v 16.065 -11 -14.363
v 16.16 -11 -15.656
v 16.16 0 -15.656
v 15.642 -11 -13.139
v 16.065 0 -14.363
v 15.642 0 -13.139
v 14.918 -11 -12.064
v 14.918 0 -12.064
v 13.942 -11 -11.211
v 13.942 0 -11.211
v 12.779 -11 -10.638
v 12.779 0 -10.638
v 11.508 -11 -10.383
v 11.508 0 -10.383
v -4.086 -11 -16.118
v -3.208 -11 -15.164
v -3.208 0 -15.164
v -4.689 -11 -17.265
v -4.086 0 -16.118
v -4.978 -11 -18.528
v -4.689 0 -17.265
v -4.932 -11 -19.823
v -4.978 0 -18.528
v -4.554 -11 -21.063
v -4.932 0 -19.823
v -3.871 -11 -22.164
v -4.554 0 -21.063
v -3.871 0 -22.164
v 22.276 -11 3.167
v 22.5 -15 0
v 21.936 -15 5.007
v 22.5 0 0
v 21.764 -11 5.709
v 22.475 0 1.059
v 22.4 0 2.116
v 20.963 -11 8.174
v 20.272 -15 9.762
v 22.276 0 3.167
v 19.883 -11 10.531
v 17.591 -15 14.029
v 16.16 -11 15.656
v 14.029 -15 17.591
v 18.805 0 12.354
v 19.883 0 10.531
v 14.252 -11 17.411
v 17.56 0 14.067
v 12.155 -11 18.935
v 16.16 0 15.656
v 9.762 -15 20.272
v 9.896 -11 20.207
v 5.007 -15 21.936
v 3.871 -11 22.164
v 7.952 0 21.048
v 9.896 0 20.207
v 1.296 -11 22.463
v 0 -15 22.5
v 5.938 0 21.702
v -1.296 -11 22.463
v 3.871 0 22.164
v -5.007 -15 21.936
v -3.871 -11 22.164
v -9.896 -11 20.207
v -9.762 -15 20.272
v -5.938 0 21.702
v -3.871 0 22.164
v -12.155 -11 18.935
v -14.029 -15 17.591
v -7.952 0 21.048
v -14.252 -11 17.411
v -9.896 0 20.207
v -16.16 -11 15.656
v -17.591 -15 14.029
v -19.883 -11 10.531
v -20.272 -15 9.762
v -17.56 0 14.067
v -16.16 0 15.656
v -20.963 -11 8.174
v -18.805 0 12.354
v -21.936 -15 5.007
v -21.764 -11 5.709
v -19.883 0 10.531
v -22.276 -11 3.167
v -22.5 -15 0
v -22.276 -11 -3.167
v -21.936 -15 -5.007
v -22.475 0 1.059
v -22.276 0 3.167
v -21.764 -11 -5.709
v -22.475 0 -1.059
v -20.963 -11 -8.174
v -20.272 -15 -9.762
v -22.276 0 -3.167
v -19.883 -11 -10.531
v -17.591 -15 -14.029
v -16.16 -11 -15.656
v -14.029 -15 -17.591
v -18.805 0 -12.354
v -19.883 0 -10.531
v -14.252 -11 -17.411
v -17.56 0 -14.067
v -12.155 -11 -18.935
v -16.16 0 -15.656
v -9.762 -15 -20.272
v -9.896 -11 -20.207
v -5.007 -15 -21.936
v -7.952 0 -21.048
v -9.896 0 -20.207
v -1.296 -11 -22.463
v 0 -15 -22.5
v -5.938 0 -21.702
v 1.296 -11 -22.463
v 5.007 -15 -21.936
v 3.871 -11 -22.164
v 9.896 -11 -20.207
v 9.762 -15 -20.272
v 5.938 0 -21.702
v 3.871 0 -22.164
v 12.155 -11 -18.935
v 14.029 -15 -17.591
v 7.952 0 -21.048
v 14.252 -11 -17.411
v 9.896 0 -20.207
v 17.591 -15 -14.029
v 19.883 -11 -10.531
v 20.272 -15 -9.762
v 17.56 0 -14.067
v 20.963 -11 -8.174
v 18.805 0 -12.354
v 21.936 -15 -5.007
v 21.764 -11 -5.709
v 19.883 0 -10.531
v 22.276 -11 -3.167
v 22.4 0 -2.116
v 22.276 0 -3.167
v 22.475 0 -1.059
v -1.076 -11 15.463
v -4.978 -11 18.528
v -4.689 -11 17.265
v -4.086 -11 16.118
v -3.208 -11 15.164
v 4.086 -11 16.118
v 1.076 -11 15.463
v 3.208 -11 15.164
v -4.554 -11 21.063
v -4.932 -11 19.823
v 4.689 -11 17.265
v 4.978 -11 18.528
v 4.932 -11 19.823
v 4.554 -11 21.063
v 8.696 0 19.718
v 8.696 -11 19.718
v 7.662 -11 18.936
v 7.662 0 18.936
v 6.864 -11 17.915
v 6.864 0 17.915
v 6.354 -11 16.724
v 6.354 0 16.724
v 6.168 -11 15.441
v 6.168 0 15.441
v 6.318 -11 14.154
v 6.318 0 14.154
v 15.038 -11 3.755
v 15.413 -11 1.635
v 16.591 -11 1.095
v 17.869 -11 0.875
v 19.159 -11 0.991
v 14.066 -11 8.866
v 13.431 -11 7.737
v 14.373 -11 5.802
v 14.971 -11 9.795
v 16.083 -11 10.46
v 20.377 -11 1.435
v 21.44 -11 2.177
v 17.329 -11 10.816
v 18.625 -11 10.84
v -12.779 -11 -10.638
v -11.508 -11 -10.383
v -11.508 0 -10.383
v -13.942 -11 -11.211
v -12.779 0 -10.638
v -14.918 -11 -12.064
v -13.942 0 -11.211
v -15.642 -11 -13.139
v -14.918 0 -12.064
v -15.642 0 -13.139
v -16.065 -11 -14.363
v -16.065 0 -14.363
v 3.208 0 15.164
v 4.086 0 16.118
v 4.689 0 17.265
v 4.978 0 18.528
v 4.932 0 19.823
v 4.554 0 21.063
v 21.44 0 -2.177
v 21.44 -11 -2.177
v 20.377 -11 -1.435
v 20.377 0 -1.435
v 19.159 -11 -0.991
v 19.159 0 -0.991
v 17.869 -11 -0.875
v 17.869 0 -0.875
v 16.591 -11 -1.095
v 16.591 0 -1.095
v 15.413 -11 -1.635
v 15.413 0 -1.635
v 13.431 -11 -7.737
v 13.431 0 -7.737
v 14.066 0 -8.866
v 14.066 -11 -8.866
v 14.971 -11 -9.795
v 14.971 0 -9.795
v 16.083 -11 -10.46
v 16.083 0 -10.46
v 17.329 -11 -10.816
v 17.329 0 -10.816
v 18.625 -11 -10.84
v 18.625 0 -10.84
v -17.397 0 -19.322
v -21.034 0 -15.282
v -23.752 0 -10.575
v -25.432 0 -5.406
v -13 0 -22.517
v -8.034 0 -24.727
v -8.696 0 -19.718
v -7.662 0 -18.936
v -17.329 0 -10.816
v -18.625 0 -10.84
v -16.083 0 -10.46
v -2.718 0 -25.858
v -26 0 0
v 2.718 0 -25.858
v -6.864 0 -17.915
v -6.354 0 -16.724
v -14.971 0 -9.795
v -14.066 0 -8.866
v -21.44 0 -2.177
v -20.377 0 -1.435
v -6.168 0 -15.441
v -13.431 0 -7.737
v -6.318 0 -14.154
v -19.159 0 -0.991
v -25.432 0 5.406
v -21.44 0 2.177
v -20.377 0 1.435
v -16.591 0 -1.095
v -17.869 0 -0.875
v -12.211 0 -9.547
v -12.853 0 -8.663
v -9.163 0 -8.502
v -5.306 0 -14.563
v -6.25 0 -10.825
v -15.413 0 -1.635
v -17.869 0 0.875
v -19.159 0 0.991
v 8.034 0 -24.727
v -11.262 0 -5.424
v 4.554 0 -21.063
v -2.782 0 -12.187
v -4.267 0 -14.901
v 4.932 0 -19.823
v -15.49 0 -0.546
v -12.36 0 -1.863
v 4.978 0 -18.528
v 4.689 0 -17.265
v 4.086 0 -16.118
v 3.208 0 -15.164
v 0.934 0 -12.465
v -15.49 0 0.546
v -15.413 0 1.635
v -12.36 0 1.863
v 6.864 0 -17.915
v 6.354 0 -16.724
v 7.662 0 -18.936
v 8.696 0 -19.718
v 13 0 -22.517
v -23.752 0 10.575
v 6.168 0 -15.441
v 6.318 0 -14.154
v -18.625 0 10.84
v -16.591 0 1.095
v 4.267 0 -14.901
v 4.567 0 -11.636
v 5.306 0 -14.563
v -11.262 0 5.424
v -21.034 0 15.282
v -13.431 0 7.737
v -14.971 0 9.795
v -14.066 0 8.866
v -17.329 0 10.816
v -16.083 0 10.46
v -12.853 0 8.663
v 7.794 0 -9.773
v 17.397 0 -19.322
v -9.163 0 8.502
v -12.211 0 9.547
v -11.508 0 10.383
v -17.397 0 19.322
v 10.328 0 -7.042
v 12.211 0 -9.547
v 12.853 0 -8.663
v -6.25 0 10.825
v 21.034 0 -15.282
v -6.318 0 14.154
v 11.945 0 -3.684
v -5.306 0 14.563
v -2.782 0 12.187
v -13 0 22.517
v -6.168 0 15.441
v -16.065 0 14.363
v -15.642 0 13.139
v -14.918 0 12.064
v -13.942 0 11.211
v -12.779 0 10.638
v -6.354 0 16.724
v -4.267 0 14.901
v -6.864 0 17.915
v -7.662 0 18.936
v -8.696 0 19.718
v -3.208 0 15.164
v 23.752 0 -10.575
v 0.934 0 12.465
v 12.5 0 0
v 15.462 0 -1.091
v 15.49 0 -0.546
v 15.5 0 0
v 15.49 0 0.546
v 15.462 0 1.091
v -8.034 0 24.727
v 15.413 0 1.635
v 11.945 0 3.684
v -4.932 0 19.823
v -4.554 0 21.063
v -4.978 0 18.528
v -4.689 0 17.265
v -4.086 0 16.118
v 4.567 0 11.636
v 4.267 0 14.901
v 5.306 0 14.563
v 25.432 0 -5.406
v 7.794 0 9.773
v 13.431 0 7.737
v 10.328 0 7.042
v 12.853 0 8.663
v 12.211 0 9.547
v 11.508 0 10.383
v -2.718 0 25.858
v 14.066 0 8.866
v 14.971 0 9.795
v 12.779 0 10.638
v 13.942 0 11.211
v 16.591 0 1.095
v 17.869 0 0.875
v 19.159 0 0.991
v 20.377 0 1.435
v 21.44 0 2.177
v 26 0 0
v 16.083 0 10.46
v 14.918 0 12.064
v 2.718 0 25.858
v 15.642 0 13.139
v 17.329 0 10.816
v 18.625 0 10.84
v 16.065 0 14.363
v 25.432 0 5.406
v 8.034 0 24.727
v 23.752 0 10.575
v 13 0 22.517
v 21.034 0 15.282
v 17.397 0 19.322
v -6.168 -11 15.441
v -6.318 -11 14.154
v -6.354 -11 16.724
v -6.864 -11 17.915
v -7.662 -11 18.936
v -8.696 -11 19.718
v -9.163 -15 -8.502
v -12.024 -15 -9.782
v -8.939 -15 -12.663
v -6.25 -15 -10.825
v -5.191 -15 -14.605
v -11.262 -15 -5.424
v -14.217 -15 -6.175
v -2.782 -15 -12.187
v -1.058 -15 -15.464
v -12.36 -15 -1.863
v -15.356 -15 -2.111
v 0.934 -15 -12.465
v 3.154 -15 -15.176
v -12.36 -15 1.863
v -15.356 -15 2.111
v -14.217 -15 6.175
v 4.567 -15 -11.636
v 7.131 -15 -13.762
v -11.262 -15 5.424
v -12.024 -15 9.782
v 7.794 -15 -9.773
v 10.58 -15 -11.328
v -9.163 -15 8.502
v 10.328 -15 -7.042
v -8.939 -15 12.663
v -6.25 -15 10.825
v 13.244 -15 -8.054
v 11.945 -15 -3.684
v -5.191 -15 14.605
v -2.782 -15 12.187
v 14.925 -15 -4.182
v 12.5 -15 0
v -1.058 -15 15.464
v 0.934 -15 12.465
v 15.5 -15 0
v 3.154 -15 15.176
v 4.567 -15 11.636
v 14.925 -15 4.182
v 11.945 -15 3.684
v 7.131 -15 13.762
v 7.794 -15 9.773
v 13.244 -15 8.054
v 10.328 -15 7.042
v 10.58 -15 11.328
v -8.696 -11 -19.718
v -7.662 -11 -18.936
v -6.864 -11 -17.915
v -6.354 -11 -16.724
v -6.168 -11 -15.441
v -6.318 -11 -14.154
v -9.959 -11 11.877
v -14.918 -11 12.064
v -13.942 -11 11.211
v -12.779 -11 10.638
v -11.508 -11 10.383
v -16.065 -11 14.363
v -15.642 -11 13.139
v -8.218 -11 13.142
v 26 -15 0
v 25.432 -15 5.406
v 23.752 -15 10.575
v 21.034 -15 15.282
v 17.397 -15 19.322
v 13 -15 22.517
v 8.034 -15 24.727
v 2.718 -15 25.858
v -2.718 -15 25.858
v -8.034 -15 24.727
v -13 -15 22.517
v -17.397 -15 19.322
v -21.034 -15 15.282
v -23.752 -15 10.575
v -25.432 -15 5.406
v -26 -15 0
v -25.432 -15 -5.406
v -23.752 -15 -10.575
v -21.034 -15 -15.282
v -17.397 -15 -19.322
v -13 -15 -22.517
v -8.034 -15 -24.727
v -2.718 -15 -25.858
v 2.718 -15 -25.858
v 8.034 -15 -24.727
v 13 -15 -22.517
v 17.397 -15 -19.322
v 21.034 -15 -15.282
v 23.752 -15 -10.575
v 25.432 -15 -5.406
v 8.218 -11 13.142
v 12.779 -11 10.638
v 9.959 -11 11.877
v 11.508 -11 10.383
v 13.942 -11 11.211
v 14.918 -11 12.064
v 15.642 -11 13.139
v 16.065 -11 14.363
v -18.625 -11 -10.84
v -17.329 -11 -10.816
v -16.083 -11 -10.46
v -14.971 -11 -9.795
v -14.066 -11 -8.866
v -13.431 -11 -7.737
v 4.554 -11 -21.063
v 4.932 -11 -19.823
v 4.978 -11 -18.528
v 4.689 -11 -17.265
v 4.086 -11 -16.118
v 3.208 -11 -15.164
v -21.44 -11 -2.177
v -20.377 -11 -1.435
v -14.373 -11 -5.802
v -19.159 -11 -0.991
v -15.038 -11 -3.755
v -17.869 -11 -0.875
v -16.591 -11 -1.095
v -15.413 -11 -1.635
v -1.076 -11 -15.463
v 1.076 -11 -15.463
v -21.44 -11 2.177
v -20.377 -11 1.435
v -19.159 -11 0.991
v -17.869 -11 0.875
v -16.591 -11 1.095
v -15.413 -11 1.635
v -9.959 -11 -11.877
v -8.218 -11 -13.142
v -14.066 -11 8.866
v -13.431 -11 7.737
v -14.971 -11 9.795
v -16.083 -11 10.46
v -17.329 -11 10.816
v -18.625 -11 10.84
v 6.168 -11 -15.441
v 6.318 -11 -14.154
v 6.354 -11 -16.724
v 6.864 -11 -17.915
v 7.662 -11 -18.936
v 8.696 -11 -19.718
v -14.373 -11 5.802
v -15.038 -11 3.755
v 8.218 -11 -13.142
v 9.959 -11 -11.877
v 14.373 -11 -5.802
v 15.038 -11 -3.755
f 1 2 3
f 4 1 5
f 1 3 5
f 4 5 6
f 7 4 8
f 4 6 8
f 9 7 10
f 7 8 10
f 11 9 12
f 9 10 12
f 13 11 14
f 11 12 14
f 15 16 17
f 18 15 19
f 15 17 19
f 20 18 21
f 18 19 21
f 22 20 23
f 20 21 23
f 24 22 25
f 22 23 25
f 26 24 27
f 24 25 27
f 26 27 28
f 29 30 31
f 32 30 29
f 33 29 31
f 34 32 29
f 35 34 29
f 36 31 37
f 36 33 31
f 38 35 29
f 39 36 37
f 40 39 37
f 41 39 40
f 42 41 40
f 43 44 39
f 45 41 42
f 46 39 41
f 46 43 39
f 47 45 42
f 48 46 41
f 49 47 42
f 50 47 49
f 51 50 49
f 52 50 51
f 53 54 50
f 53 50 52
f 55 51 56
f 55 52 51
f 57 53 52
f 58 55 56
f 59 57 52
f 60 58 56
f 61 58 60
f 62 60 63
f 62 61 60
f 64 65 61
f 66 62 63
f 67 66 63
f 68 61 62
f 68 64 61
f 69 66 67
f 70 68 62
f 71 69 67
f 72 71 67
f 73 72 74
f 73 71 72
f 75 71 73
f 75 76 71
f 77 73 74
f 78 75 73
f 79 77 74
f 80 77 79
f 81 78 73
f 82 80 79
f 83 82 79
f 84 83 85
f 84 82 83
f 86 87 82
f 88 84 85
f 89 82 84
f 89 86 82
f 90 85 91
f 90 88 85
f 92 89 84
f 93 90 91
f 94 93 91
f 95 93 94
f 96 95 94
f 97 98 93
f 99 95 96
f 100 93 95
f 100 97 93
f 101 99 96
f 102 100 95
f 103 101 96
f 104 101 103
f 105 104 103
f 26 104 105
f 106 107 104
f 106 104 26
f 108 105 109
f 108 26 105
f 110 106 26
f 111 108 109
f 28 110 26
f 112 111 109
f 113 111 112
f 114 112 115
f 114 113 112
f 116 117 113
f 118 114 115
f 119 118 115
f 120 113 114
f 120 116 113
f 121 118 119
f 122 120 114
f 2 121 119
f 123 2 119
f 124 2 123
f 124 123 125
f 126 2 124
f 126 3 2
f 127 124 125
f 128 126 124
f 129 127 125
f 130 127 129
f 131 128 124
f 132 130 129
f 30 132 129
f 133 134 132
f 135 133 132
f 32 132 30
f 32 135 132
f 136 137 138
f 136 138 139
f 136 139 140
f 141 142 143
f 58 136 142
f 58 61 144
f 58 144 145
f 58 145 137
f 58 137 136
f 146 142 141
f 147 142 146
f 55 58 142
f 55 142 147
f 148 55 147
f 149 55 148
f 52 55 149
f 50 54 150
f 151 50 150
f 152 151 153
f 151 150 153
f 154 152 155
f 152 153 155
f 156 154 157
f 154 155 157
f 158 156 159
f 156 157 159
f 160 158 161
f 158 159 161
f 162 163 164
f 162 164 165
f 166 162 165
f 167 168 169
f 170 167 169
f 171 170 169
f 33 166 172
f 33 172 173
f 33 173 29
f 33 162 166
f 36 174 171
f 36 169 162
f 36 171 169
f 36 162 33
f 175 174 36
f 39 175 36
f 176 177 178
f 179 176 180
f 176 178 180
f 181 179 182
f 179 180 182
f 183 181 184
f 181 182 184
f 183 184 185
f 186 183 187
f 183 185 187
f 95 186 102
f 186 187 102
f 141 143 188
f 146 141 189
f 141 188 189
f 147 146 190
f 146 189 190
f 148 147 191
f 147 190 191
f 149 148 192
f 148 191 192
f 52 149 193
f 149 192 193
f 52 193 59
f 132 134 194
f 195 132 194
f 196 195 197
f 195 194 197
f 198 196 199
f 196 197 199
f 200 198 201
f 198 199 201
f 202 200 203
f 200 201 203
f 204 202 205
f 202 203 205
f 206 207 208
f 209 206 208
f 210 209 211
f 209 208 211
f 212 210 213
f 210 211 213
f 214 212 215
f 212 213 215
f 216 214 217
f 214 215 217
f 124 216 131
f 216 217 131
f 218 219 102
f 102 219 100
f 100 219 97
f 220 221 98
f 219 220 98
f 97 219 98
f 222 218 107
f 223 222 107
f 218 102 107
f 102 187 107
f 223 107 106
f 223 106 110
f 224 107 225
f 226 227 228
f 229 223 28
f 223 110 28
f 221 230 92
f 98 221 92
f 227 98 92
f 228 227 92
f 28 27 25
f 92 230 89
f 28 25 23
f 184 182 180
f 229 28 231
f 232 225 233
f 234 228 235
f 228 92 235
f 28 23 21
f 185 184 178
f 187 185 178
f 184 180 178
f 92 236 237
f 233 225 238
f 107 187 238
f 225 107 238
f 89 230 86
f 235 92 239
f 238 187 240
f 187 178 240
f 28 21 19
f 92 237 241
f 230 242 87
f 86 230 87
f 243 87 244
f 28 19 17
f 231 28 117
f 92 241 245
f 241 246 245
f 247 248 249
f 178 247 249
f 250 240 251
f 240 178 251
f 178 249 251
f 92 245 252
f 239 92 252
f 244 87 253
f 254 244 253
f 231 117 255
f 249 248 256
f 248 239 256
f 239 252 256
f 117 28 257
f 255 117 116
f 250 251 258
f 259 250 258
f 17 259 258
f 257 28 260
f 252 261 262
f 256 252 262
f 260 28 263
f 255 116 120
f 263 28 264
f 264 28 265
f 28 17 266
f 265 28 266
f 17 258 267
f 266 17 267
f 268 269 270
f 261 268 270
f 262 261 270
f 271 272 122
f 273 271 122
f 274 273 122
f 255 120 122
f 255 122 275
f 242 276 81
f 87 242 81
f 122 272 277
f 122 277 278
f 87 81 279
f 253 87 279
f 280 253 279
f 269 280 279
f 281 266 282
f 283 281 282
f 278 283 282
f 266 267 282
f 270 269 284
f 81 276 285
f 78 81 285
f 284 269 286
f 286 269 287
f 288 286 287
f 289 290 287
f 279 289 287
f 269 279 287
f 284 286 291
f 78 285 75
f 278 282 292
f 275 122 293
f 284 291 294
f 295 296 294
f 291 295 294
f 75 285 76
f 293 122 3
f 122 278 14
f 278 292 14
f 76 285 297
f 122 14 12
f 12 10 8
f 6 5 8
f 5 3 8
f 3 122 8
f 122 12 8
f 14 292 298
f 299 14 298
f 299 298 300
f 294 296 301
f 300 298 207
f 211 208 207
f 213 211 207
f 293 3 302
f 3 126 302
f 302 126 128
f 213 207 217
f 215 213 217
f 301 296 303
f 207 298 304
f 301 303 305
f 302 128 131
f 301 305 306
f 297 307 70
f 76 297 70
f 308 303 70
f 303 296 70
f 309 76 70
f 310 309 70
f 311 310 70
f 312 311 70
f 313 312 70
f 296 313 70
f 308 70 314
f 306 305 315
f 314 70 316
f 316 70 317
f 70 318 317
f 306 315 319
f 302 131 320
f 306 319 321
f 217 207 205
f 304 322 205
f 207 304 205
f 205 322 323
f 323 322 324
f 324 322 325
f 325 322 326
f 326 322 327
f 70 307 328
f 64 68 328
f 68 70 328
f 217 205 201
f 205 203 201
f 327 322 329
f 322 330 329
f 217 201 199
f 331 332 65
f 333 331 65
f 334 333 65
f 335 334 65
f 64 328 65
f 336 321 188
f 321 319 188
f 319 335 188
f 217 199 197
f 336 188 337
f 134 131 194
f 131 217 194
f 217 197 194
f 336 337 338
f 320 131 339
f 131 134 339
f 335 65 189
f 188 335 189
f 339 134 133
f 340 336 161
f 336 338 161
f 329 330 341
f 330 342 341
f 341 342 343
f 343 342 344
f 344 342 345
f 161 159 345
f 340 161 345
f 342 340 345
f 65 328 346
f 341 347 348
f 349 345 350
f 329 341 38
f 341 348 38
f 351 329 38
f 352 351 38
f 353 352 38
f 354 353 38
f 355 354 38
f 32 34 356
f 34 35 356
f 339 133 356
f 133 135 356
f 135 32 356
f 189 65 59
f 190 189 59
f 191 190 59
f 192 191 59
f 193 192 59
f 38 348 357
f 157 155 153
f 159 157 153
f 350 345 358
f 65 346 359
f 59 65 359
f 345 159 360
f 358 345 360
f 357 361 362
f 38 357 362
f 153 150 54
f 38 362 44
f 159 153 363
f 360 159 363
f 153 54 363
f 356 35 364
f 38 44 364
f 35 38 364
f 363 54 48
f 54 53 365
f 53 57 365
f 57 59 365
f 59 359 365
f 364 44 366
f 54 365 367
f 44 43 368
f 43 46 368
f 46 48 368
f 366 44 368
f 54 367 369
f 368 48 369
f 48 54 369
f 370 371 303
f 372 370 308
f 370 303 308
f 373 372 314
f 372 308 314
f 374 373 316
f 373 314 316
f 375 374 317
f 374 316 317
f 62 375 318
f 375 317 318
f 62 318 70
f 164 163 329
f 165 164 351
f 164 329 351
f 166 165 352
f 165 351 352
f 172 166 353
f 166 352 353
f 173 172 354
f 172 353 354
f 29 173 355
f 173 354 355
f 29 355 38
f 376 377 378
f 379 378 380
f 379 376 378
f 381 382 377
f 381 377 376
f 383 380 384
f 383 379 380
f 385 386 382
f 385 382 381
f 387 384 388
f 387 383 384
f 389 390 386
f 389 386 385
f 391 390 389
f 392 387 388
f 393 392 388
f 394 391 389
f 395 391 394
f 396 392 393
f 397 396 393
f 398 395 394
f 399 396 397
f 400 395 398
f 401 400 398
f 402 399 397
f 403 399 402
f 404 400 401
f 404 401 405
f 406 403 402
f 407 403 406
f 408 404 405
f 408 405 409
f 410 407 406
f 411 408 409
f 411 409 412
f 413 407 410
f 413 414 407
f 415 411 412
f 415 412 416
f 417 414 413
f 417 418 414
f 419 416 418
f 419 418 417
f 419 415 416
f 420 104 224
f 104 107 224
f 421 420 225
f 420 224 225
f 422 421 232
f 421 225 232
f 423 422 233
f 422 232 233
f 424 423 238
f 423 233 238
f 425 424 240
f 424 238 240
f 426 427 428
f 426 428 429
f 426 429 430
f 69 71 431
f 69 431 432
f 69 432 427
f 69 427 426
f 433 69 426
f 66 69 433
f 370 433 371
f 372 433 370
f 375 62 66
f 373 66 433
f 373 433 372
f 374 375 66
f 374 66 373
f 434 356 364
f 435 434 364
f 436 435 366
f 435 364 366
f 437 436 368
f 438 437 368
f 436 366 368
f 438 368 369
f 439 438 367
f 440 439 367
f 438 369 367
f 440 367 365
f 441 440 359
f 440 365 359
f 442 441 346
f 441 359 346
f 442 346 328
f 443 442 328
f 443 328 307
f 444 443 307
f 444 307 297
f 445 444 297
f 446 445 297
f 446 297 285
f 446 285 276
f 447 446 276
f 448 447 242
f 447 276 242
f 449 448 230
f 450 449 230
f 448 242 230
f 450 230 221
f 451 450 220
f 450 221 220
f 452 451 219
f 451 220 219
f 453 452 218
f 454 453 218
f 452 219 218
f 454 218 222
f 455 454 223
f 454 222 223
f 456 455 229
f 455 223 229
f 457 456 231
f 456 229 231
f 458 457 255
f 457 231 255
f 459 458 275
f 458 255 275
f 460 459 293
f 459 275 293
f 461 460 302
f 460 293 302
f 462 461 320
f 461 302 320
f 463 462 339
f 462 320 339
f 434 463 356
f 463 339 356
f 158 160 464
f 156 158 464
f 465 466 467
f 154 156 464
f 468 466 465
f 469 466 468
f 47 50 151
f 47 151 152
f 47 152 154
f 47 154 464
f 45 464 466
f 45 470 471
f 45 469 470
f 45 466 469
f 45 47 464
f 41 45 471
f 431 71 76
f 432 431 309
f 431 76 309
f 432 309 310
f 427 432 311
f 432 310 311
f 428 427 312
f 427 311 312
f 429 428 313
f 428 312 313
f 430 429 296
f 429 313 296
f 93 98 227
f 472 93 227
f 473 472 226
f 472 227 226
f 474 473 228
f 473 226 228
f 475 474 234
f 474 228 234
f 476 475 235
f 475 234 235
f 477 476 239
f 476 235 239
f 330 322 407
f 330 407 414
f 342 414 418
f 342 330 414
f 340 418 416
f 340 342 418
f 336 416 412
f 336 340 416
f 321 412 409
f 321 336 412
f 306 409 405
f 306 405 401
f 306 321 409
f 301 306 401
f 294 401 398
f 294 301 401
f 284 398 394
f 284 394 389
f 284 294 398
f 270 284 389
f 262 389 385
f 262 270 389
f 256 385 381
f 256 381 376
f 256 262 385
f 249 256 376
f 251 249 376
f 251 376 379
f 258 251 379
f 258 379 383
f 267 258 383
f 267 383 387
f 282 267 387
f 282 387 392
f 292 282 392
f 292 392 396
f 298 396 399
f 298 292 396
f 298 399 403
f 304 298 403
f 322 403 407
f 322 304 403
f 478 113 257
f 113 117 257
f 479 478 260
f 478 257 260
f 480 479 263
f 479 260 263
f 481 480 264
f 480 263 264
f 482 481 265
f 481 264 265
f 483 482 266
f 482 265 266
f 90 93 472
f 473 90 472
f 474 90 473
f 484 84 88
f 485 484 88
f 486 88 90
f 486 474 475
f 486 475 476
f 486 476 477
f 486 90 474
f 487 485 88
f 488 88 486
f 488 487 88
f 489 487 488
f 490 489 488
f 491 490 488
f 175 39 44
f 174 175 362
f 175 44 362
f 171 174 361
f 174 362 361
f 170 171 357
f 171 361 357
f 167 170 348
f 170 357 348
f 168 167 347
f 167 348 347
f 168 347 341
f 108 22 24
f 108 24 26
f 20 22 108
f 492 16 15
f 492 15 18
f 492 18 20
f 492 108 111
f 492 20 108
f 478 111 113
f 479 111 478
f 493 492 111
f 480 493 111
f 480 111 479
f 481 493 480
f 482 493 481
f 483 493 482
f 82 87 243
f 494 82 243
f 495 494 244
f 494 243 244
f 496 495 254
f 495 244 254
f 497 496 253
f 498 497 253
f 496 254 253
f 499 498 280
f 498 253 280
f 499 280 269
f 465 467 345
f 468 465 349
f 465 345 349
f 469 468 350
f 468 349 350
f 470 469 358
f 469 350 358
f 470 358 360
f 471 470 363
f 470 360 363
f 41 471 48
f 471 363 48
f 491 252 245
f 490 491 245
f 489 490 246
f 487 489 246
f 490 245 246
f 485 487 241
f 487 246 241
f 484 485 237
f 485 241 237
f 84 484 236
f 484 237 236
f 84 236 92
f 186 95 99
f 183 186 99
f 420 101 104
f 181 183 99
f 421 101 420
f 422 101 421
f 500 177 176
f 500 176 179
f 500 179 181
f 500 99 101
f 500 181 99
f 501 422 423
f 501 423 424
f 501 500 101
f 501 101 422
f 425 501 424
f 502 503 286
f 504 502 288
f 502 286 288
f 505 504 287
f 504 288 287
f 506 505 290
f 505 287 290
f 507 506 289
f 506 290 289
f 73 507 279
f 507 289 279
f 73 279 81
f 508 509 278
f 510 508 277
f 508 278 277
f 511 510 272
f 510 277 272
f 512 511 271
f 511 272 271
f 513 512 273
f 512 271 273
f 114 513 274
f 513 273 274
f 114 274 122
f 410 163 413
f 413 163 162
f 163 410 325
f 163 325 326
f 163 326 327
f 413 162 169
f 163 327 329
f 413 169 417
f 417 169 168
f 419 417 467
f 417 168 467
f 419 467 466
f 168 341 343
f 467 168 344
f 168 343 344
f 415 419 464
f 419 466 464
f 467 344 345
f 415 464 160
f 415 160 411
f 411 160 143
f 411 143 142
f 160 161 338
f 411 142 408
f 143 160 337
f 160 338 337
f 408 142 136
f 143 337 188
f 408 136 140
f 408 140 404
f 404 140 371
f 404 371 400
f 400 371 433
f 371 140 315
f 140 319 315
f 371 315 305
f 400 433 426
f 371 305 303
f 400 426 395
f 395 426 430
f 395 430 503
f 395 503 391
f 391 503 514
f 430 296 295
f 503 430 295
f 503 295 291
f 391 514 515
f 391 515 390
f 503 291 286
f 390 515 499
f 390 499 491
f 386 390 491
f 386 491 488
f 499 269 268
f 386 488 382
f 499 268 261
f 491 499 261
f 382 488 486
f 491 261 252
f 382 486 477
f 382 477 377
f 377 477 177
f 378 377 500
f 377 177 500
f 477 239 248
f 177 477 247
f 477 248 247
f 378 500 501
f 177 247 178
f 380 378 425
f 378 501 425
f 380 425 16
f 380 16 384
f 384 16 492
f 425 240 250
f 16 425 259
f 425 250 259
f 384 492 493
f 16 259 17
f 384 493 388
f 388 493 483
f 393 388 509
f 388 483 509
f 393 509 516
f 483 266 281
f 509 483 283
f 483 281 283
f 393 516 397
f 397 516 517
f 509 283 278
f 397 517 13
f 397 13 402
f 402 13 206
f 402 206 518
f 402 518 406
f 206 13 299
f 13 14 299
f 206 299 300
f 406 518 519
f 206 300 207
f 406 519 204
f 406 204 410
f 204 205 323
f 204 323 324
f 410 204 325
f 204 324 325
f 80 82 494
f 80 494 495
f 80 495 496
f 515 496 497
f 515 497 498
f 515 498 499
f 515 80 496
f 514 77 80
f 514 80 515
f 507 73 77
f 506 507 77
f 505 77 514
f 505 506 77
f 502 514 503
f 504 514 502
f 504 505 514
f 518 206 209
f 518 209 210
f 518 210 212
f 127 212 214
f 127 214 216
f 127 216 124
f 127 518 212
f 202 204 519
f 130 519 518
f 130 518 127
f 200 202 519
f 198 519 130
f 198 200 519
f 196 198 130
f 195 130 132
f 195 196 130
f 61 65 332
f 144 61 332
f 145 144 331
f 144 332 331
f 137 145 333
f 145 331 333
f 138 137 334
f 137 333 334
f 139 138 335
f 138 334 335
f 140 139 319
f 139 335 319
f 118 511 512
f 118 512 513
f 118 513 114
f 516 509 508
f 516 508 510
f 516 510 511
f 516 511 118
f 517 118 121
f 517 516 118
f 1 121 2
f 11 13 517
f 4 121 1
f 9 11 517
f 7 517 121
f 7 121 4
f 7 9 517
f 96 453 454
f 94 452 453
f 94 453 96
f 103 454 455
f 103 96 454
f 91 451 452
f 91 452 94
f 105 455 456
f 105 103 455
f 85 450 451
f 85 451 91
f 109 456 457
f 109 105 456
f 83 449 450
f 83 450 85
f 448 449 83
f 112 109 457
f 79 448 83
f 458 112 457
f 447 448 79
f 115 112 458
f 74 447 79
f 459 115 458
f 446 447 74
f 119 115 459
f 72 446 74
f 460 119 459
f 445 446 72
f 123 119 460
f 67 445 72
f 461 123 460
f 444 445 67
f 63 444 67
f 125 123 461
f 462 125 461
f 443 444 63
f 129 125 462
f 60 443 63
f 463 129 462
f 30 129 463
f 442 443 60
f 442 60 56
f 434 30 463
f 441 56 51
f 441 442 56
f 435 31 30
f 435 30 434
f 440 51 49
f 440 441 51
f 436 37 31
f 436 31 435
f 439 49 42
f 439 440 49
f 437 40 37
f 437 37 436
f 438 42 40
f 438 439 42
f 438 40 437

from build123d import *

# Parameters (mm, degrees)
F0_R     = 15.5
F0_R_2   = 12.5
F1_DEPTH = 15
F0_R_3   = 26
F0_R_4   = 22.5
F3_R     = 5
F4_DEPTH = 11


with BuildPart() as f1:
    # F0 (on Front) → F1 (new body)
    with BuildSketch(Plane.XZ):
        Circle(F0_R)
        Circle(F0_R_2, mode=Mode.SUBTRACT)
    extrude(amount=F1_DEPTH)



with BuildPart() as f1b:
    # F0 (on Front) → F1, piece 2 (new body)
    with BuildSketch(Plane.XZ):
        Circle(F0_R_3)
        Circle(F0_R_4, mode=Mode.SUBTRACT)
    extrude(amount=F1_DEPTH)


with BuildPart() as f1_1:
    add(f1.part)

    add(f1b.part)  # F4 merges F1b
    # F3 (on offset) → F4 (join)
    with BuildSketch(Plane.XZ):
        with Locations((0, 19)):
            Circle(F3_R)
        with Locations((11.1679197936, 15.3713228931)):
            Circle(F3_R)
        with Locations((18.0700738096, 5.8713228931)):
            Circle(F3_R)
        with Locations((18.0700738096, -5.8713228931)):
            Circle(F3_R)
        with Locations((11.1679197936, -15.3713228931)):
            Circle(F3_R)
        with Locations((0, -19)):
            Circle(F3_R)
        with Locations((-11.1679197936, -15.3713228931)):
            Circle(F3_R)
        with Locations((-18.0700738096, -5.8713228931)):
            Circle(F3_R)
        with Locations((-18.0700738096, 5.8713228931)):
            Circle(F3_R)
        with Locations((-11.1679197936, 15.3713228931)):
            Circle(F3_R)
    extrude(amount=F4_DEPTH)


solid = f1_1.part
